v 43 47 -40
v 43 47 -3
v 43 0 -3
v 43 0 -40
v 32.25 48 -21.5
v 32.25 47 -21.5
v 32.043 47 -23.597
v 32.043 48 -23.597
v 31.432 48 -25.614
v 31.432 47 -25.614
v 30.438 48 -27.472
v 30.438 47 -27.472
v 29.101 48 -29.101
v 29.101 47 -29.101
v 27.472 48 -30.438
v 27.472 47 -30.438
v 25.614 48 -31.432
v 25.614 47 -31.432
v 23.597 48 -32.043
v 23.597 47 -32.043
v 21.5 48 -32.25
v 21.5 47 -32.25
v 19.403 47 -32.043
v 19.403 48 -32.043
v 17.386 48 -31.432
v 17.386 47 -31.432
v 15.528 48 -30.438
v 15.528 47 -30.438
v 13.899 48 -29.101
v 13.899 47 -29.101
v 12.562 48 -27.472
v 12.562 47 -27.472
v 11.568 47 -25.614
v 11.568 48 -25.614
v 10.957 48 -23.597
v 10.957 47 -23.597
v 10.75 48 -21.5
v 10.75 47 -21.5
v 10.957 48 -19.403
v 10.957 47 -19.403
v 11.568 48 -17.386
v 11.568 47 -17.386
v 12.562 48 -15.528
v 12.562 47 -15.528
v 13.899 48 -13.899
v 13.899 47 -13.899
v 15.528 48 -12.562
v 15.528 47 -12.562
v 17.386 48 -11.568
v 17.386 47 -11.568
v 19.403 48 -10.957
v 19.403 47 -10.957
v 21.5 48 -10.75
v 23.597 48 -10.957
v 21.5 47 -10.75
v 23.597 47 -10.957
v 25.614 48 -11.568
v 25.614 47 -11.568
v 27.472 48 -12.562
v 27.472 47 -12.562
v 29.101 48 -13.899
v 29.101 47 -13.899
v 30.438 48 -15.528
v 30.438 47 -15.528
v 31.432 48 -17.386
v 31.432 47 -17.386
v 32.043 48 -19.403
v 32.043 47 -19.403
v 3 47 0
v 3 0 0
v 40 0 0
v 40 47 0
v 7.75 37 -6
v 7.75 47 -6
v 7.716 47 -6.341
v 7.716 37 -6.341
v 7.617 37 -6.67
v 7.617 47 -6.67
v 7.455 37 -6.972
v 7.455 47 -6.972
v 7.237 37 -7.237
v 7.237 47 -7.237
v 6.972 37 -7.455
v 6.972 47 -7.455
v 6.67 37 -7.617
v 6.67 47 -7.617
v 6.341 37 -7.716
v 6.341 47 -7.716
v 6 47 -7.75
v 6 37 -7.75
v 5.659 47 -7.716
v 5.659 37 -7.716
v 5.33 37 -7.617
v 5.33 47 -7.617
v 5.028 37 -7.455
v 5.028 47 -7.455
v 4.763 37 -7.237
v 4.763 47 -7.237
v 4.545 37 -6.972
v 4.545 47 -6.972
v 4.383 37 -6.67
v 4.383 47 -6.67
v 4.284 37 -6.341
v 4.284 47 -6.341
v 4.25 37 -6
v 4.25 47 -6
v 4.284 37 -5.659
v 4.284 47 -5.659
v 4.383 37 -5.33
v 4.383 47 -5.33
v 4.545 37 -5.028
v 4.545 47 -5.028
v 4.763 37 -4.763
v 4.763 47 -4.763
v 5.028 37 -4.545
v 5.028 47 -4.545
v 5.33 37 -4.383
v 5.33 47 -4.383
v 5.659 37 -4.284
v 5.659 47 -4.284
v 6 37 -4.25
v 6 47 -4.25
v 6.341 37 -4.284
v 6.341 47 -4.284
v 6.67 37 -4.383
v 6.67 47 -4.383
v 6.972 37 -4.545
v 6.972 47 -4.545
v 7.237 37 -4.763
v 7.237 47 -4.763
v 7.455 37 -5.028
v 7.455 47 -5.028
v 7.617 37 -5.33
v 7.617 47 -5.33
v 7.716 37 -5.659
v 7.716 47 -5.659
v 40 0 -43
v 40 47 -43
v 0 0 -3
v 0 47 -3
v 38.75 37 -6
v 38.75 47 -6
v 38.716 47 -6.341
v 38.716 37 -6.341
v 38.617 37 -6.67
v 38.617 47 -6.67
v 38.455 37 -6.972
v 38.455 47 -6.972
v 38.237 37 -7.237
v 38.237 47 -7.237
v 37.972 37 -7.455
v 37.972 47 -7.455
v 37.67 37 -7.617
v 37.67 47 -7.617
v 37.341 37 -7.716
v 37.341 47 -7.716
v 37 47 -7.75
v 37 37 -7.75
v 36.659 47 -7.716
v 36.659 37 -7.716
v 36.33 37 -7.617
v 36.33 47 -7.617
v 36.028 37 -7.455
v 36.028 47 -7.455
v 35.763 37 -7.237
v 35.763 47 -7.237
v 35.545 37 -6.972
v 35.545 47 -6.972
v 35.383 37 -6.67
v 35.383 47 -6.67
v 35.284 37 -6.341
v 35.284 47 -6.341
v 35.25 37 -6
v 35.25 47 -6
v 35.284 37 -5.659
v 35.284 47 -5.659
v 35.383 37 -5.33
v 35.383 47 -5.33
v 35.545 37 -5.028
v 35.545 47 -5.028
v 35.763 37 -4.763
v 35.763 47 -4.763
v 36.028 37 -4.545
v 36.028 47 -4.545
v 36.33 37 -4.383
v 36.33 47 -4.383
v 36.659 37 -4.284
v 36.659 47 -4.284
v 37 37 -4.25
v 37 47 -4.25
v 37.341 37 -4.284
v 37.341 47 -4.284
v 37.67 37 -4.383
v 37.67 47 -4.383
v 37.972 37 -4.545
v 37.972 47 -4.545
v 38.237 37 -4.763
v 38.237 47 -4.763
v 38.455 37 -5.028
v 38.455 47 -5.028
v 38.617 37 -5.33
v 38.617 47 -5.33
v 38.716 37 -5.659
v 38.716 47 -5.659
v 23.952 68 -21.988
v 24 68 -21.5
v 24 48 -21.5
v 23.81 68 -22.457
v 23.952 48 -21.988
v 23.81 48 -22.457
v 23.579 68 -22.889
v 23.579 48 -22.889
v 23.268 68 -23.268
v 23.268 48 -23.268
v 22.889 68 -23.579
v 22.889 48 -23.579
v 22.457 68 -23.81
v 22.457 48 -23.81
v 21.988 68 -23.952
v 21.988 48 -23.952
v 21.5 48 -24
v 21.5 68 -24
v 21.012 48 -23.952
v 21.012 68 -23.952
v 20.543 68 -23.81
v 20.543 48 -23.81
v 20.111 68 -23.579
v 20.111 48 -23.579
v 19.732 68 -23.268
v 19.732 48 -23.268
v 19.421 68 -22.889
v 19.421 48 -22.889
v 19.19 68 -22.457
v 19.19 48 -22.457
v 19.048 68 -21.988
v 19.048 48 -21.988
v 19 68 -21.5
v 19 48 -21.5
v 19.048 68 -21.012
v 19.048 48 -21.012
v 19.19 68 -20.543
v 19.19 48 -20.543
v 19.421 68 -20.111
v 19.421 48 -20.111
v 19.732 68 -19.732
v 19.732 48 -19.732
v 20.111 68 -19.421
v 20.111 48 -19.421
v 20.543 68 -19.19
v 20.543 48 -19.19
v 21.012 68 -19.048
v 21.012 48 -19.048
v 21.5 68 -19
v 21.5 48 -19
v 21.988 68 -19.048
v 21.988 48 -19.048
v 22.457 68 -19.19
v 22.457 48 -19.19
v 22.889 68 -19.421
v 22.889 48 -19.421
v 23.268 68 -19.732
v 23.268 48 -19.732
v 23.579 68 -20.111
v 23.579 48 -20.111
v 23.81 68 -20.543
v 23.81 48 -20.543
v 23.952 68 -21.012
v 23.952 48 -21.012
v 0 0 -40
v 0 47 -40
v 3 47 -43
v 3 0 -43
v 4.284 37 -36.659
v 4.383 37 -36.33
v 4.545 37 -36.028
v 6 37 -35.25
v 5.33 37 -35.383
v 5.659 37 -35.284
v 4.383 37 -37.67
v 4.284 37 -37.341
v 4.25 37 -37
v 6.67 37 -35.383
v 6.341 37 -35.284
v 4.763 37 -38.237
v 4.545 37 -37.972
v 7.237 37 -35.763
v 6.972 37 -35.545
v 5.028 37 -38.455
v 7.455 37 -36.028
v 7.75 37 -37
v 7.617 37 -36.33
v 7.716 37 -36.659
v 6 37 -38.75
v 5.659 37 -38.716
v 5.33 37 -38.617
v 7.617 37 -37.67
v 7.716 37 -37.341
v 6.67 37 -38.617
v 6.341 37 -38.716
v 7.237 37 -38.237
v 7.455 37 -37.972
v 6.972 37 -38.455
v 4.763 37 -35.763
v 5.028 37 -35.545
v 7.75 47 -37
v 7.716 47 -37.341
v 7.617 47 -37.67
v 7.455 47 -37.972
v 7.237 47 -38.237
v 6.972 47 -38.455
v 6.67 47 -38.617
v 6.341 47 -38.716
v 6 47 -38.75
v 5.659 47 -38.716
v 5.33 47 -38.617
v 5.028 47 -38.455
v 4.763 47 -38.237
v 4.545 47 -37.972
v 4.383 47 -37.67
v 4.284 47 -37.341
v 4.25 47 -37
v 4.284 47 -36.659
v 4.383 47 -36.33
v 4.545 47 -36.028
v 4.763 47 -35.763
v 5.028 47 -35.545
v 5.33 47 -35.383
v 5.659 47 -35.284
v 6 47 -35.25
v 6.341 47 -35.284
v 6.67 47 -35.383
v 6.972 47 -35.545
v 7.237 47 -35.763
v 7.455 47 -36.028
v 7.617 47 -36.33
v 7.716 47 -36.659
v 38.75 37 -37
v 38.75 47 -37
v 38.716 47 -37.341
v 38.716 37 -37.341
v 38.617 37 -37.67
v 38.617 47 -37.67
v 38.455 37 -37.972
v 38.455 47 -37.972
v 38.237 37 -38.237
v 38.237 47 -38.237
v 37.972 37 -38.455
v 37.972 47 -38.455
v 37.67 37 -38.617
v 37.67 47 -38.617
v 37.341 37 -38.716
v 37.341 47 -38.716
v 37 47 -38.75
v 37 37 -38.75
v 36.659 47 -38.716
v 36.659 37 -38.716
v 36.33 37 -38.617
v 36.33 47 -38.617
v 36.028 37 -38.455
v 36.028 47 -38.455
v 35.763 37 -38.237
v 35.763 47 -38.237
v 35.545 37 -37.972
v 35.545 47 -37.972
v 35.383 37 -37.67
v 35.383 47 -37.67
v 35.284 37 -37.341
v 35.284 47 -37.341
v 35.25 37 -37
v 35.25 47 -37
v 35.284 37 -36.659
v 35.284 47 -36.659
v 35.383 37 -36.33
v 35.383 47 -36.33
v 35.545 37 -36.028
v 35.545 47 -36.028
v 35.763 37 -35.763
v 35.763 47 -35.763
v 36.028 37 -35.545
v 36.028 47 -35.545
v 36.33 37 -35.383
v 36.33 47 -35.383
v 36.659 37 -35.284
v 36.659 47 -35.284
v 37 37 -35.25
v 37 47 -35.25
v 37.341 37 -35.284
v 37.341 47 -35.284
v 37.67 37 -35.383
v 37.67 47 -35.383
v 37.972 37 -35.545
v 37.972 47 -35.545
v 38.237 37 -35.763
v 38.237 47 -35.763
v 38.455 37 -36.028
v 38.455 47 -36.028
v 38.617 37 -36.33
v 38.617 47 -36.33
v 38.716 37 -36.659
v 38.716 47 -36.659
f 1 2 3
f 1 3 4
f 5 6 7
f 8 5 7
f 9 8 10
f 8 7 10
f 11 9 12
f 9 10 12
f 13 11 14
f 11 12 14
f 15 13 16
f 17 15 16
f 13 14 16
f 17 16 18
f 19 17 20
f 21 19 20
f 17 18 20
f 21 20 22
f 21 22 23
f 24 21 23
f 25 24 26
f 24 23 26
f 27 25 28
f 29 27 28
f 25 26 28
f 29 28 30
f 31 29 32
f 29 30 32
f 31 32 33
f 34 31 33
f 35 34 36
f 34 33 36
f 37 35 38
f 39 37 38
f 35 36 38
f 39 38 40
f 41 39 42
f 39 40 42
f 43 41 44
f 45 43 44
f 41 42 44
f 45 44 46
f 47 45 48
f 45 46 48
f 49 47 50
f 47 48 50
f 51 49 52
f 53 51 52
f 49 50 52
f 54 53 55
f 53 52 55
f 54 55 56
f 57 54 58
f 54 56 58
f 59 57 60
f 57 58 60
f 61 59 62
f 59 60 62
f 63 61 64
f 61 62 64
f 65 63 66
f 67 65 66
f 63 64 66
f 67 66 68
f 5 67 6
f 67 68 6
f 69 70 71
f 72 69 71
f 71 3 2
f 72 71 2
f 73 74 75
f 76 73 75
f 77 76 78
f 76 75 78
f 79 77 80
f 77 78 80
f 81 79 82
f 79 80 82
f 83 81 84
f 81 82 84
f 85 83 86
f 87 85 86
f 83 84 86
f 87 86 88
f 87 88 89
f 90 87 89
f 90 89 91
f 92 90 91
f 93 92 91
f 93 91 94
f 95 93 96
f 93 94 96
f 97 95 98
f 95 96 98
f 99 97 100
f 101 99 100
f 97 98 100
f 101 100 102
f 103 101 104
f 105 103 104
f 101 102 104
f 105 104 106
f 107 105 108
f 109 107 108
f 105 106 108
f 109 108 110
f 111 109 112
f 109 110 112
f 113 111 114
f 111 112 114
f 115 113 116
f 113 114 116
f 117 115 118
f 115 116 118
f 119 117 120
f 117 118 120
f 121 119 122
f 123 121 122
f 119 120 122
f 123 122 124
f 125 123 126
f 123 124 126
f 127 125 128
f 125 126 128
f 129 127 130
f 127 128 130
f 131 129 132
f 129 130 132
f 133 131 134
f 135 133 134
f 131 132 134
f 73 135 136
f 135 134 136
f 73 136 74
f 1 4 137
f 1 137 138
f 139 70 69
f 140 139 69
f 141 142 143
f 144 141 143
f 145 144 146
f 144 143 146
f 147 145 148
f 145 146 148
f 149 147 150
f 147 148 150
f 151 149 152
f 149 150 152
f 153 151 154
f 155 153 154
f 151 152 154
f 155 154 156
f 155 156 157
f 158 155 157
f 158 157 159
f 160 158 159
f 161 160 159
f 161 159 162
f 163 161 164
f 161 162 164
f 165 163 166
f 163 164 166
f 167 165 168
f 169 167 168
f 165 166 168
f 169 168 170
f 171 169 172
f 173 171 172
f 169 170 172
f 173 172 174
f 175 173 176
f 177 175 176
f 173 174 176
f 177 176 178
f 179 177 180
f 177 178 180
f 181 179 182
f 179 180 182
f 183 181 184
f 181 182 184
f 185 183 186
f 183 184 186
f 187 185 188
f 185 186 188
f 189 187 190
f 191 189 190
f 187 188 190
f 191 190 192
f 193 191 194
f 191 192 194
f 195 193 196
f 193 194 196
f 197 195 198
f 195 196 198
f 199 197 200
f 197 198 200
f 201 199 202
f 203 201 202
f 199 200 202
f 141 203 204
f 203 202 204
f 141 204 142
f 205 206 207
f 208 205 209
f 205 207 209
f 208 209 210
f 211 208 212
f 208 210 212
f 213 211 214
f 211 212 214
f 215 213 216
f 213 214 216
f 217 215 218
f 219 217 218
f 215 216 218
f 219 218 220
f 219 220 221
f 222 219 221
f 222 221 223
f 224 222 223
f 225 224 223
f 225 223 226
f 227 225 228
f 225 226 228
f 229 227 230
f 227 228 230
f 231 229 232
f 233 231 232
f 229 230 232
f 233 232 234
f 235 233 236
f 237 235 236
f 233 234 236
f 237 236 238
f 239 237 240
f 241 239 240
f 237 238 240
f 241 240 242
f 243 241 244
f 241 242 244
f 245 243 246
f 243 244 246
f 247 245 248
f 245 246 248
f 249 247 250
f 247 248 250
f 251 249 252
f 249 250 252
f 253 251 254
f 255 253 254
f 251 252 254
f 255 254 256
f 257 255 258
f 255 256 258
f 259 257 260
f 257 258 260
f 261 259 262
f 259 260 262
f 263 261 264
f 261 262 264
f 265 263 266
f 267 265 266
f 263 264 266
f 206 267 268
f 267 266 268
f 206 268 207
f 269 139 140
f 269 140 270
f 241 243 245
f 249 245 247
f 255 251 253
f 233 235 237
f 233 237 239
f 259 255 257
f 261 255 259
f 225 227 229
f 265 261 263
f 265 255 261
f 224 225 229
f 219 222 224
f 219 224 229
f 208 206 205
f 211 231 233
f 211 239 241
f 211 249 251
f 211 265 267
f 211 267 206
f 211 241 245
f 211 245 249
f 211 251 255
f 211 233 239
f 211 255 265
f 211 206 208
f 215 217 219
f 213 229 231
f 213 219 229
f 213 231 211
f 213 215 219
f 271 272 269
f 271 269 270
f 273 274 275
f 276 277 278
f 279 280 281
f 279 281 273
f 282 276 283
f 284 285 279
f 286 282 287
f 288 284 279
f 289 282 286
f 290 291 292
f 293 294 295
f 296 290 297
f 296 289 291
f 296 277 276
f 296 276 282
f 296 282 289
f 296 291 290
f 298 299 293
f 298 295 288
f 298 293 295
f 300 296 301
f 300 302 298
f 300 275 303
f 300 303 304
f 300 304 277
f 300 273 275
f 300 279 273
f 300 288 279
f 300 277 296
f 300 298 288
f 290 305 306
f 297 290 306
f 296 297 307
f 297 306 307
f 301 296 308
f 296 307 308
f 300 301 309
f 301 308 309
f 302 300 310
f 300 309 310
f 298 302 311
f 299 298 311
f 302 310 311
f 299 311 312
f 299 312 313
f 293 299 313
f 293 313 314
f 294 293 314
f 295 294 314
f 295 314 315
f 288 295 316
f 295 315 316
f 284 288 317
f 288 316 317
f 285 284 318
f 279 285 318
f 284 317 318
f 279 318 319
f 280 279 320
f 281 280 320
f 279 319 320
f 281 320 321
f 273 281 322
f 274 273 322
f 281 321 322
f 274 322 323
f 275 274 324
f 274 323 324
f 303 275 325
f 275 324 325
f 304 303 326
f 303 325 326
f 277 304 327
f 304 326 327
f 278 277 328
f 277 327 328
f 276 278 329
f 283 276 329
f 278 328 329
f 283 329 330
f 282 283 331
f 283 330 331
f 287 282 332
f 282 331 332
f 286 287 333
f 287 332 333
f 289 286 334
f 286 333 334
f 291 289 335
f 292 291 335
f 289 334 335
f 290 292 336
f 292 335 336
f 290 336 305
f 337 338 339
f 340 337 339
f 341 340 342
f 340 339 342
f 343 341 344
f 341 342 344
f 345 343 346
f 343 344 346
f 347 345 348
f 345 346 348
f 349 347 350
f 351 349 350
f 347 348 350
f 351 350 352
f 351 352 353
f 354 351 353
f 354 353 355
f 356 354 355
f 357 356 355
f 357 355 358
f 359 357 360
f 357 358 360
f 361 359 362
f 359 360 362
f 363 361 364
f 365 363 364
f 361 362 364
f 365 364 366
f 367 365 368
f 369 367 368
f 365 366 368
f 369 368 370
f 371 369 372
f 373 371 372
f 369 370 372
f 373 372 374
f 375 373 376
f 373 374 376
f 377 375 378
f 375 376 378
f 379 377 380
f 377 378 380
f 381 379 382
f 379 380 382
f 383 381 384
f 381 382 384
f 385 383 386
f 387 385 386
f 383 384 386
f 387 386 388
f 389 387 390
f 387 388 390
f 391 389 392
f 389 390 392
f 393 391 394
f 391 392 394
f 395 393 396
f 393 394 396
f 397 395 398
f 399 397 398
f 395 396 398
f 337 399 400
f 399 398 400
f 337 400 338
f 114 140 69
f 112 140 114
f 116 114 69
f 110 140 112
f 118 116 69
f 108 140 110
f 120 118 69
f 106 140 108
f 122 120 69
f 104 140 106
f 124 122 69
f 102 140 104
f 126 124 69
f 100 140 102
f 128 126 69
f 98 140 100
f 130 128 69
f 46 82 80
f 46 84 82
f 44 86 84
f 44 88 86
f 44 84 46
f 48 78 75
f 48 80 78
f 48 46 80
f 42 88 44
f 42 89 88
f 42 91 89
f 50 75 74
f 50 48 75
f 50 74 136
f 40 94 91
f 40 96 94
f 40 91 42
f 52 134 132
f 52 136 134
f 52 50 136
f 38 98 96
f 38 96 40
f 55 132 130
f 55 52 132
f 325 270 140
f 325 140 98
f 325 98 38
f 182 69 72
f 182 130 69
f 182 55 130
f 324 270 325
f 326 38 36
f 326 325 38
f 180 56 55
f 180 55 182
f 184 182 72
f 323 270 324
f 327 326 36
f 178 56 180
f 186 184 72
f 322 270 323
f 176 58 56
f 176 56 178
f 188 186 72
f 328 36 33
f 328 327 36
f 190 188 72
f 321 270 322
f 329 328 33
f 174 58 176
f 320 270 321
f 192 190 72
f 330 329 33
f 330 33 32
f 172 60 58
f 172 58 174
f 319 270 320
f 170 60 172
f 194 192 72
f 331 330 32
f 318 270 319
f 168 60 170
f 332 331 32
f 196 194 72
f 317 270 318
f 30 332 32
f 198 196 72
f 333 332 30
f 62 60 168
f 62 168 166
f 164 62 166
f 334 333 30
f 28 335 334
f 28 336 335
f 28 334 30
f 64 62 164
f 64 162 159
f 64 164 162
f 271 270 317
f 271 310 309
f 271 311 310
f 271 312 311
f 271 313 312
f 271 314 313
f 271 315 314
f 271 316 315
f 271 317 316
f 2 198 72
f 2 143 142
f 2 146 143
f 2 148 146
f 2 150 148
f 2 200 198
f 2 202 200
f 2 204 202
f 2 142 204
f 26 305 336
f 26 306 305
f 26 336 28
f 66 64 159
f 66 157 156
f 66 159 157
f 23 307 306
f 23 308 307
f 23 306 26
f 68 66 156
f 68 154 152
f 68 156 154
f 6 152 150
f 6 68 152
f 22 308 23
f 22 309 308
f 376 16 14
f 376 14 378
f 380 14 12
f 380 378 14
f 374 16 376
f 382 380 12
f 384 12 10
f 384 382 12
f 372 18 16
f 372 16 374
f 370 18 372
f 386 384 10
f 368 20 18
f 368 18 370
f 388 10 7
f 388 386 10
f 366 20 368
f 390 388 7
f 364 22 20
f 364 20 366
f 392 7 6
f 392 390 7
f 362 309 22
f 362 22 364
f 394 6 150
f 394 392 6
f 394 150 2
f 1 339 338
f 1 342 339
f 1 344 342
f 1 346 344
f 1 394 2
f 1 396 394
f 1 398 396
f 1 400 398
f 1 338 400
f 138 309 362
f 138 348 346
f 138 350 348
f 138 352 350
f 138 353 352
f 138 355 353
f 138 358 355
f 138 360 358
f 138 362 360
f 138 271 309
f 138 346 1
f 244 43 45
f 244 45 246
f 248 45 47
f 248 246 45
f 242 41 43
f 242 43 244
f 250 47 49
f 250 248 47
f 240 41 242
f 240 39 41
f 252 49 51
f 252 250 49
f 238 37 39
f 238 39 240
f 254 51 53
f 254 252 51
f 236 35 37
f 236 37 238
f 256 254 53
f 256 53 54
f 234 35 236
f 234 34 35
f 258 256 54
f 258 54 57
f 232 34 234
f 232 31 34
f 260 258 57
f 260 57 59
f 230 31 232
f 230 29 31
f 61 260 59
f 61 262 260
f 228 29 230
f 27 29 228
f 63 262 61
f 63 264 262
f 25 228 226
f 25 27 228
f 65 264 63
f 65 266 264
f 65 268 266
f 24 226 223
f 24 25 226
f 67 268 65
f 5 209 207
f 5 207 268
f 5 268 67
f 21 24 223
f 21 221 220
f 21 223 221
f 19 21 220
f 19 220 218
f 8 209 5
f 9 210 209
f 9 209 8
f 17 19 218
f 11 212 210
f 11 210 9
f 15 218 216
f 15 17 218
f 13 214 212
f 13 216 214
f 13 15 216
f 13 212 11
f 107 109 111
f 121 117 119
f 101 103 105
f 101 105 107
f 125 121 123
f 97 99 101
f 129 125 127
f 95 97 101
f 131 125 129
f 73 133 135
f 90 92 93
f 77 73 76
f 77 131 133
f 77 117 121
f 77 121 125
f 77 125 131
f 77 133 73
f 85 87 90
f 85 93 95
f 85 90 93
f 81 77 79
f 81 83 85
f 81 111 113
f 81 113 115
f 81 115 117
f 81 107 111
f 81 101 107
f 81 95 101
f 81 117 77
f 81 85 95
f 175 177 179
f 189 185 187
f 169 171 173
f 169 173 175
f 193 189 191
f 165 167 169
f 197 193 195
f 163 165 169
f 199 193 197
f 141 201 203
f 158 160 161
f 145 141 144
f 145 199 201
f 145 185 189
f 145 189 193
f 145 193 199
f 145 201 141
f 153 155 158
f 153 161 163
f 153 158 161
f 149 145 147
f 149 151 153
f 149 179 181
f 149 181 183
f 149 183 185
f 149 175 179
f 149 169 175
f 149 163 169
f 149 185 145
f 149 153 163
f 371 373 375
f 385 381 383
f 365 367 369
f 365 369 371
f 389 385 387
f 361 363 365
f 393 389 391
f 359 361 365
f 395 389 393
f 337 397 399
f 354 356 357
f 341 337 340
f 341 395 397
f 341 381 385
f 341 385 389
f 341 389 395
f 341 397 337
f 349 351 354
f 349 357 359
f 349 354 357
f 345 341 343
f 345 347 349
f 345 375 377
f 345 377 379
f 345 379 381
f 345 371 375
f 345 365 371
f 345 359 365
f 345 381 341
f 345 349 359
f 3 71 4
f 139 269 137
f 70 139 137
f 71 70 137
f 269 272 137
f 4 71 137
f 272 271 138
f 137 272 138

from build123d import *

# Parameters (mm, degrees)
SKETCH1_W           = 43
SKETCH1_H           = 43
BOSS_EXTRUDE1_DEPTH = 47
SKETCH2_R           = 10.75
BOSS_EXTRUDE2_DEPTH = 1
SKETCH3_R           = 2.5
BOSS_EXTRUDE3_DEPTH = 20
CHAMFER1_SIZE       = 3
SKETCH4_R           = 1.75
CUT_EXTRUDE2_DEPTH  = 10


with BuildPart() as part:
    # Sketch1 → Boss-Extrude1 (new body)
    with BuildSketch(Plane(origin=(0, 0, 0), x_dir=(1, 0, 0), z_dir=(0, 1, 0))):
        with Locations((21.5, 21.5)):
            Rectangle(SKETCH1_W, SKETCH1_H)
    extrude(amount=BOSS_EXTRUDE1_DEPTH)

    # Sketch2 → Boss-Extrude2 (add)
    with BuildSketch(Plane(origin=(0, 47, 0), x_dir=(1, 0, 0), z_dir=(0, 1, 0))):
        with Locations((21.5, 21.5)):
            Circle(SKETCH2_R)
    extrude(amount=BOSS_EXTRUDE2_DEPTH)

    # Sketch3 → Boss-Extrude3 (add)
    with BuildSketch(Plane(origin=(0, 48, 0), x_dir=(1, 0, 0), z_dir=(0, 1, 0))):
        with Locations((21.5, 21.5)):
            Circle(SKETCH3_R)
    extrude(amount=BOSS_EXTRUDE3_DEPTH)

    # Chamfer1
    chamfer1_edges = [part.edges().sort_by_distance(p)[0] for p in [
        (0, 23.5, -43),
        (43, 23.5, -43),
        (43, 23.5, 0),
        (0, 23.5, 0),
    ]]
    chamfer(chamfer1_edges, length=CHAMFER1_SIZE)

    # Sketch4 → Cut-Extrude2 (cut)
    with BuildSketch(Plane(origin=(0, 47, 0), x_dir=(1, 0, 0), z_dir=(0, 1, 0))):
        with Locations((6, 37)):
            Circle(SKETCH4_R)
        with Locations((6, 6)):
            Circle(SKETCH4_R)
        with Locations((37, 6)):
            Circle(SKETCH4_R)
        with Locations((37, 37)):
            Circle(SKETCH4_R)
    extrude(amount=-CUT_EXTRUDE2_DEPTH, mode=Mode.SUBTRACT)


solid = part.part
